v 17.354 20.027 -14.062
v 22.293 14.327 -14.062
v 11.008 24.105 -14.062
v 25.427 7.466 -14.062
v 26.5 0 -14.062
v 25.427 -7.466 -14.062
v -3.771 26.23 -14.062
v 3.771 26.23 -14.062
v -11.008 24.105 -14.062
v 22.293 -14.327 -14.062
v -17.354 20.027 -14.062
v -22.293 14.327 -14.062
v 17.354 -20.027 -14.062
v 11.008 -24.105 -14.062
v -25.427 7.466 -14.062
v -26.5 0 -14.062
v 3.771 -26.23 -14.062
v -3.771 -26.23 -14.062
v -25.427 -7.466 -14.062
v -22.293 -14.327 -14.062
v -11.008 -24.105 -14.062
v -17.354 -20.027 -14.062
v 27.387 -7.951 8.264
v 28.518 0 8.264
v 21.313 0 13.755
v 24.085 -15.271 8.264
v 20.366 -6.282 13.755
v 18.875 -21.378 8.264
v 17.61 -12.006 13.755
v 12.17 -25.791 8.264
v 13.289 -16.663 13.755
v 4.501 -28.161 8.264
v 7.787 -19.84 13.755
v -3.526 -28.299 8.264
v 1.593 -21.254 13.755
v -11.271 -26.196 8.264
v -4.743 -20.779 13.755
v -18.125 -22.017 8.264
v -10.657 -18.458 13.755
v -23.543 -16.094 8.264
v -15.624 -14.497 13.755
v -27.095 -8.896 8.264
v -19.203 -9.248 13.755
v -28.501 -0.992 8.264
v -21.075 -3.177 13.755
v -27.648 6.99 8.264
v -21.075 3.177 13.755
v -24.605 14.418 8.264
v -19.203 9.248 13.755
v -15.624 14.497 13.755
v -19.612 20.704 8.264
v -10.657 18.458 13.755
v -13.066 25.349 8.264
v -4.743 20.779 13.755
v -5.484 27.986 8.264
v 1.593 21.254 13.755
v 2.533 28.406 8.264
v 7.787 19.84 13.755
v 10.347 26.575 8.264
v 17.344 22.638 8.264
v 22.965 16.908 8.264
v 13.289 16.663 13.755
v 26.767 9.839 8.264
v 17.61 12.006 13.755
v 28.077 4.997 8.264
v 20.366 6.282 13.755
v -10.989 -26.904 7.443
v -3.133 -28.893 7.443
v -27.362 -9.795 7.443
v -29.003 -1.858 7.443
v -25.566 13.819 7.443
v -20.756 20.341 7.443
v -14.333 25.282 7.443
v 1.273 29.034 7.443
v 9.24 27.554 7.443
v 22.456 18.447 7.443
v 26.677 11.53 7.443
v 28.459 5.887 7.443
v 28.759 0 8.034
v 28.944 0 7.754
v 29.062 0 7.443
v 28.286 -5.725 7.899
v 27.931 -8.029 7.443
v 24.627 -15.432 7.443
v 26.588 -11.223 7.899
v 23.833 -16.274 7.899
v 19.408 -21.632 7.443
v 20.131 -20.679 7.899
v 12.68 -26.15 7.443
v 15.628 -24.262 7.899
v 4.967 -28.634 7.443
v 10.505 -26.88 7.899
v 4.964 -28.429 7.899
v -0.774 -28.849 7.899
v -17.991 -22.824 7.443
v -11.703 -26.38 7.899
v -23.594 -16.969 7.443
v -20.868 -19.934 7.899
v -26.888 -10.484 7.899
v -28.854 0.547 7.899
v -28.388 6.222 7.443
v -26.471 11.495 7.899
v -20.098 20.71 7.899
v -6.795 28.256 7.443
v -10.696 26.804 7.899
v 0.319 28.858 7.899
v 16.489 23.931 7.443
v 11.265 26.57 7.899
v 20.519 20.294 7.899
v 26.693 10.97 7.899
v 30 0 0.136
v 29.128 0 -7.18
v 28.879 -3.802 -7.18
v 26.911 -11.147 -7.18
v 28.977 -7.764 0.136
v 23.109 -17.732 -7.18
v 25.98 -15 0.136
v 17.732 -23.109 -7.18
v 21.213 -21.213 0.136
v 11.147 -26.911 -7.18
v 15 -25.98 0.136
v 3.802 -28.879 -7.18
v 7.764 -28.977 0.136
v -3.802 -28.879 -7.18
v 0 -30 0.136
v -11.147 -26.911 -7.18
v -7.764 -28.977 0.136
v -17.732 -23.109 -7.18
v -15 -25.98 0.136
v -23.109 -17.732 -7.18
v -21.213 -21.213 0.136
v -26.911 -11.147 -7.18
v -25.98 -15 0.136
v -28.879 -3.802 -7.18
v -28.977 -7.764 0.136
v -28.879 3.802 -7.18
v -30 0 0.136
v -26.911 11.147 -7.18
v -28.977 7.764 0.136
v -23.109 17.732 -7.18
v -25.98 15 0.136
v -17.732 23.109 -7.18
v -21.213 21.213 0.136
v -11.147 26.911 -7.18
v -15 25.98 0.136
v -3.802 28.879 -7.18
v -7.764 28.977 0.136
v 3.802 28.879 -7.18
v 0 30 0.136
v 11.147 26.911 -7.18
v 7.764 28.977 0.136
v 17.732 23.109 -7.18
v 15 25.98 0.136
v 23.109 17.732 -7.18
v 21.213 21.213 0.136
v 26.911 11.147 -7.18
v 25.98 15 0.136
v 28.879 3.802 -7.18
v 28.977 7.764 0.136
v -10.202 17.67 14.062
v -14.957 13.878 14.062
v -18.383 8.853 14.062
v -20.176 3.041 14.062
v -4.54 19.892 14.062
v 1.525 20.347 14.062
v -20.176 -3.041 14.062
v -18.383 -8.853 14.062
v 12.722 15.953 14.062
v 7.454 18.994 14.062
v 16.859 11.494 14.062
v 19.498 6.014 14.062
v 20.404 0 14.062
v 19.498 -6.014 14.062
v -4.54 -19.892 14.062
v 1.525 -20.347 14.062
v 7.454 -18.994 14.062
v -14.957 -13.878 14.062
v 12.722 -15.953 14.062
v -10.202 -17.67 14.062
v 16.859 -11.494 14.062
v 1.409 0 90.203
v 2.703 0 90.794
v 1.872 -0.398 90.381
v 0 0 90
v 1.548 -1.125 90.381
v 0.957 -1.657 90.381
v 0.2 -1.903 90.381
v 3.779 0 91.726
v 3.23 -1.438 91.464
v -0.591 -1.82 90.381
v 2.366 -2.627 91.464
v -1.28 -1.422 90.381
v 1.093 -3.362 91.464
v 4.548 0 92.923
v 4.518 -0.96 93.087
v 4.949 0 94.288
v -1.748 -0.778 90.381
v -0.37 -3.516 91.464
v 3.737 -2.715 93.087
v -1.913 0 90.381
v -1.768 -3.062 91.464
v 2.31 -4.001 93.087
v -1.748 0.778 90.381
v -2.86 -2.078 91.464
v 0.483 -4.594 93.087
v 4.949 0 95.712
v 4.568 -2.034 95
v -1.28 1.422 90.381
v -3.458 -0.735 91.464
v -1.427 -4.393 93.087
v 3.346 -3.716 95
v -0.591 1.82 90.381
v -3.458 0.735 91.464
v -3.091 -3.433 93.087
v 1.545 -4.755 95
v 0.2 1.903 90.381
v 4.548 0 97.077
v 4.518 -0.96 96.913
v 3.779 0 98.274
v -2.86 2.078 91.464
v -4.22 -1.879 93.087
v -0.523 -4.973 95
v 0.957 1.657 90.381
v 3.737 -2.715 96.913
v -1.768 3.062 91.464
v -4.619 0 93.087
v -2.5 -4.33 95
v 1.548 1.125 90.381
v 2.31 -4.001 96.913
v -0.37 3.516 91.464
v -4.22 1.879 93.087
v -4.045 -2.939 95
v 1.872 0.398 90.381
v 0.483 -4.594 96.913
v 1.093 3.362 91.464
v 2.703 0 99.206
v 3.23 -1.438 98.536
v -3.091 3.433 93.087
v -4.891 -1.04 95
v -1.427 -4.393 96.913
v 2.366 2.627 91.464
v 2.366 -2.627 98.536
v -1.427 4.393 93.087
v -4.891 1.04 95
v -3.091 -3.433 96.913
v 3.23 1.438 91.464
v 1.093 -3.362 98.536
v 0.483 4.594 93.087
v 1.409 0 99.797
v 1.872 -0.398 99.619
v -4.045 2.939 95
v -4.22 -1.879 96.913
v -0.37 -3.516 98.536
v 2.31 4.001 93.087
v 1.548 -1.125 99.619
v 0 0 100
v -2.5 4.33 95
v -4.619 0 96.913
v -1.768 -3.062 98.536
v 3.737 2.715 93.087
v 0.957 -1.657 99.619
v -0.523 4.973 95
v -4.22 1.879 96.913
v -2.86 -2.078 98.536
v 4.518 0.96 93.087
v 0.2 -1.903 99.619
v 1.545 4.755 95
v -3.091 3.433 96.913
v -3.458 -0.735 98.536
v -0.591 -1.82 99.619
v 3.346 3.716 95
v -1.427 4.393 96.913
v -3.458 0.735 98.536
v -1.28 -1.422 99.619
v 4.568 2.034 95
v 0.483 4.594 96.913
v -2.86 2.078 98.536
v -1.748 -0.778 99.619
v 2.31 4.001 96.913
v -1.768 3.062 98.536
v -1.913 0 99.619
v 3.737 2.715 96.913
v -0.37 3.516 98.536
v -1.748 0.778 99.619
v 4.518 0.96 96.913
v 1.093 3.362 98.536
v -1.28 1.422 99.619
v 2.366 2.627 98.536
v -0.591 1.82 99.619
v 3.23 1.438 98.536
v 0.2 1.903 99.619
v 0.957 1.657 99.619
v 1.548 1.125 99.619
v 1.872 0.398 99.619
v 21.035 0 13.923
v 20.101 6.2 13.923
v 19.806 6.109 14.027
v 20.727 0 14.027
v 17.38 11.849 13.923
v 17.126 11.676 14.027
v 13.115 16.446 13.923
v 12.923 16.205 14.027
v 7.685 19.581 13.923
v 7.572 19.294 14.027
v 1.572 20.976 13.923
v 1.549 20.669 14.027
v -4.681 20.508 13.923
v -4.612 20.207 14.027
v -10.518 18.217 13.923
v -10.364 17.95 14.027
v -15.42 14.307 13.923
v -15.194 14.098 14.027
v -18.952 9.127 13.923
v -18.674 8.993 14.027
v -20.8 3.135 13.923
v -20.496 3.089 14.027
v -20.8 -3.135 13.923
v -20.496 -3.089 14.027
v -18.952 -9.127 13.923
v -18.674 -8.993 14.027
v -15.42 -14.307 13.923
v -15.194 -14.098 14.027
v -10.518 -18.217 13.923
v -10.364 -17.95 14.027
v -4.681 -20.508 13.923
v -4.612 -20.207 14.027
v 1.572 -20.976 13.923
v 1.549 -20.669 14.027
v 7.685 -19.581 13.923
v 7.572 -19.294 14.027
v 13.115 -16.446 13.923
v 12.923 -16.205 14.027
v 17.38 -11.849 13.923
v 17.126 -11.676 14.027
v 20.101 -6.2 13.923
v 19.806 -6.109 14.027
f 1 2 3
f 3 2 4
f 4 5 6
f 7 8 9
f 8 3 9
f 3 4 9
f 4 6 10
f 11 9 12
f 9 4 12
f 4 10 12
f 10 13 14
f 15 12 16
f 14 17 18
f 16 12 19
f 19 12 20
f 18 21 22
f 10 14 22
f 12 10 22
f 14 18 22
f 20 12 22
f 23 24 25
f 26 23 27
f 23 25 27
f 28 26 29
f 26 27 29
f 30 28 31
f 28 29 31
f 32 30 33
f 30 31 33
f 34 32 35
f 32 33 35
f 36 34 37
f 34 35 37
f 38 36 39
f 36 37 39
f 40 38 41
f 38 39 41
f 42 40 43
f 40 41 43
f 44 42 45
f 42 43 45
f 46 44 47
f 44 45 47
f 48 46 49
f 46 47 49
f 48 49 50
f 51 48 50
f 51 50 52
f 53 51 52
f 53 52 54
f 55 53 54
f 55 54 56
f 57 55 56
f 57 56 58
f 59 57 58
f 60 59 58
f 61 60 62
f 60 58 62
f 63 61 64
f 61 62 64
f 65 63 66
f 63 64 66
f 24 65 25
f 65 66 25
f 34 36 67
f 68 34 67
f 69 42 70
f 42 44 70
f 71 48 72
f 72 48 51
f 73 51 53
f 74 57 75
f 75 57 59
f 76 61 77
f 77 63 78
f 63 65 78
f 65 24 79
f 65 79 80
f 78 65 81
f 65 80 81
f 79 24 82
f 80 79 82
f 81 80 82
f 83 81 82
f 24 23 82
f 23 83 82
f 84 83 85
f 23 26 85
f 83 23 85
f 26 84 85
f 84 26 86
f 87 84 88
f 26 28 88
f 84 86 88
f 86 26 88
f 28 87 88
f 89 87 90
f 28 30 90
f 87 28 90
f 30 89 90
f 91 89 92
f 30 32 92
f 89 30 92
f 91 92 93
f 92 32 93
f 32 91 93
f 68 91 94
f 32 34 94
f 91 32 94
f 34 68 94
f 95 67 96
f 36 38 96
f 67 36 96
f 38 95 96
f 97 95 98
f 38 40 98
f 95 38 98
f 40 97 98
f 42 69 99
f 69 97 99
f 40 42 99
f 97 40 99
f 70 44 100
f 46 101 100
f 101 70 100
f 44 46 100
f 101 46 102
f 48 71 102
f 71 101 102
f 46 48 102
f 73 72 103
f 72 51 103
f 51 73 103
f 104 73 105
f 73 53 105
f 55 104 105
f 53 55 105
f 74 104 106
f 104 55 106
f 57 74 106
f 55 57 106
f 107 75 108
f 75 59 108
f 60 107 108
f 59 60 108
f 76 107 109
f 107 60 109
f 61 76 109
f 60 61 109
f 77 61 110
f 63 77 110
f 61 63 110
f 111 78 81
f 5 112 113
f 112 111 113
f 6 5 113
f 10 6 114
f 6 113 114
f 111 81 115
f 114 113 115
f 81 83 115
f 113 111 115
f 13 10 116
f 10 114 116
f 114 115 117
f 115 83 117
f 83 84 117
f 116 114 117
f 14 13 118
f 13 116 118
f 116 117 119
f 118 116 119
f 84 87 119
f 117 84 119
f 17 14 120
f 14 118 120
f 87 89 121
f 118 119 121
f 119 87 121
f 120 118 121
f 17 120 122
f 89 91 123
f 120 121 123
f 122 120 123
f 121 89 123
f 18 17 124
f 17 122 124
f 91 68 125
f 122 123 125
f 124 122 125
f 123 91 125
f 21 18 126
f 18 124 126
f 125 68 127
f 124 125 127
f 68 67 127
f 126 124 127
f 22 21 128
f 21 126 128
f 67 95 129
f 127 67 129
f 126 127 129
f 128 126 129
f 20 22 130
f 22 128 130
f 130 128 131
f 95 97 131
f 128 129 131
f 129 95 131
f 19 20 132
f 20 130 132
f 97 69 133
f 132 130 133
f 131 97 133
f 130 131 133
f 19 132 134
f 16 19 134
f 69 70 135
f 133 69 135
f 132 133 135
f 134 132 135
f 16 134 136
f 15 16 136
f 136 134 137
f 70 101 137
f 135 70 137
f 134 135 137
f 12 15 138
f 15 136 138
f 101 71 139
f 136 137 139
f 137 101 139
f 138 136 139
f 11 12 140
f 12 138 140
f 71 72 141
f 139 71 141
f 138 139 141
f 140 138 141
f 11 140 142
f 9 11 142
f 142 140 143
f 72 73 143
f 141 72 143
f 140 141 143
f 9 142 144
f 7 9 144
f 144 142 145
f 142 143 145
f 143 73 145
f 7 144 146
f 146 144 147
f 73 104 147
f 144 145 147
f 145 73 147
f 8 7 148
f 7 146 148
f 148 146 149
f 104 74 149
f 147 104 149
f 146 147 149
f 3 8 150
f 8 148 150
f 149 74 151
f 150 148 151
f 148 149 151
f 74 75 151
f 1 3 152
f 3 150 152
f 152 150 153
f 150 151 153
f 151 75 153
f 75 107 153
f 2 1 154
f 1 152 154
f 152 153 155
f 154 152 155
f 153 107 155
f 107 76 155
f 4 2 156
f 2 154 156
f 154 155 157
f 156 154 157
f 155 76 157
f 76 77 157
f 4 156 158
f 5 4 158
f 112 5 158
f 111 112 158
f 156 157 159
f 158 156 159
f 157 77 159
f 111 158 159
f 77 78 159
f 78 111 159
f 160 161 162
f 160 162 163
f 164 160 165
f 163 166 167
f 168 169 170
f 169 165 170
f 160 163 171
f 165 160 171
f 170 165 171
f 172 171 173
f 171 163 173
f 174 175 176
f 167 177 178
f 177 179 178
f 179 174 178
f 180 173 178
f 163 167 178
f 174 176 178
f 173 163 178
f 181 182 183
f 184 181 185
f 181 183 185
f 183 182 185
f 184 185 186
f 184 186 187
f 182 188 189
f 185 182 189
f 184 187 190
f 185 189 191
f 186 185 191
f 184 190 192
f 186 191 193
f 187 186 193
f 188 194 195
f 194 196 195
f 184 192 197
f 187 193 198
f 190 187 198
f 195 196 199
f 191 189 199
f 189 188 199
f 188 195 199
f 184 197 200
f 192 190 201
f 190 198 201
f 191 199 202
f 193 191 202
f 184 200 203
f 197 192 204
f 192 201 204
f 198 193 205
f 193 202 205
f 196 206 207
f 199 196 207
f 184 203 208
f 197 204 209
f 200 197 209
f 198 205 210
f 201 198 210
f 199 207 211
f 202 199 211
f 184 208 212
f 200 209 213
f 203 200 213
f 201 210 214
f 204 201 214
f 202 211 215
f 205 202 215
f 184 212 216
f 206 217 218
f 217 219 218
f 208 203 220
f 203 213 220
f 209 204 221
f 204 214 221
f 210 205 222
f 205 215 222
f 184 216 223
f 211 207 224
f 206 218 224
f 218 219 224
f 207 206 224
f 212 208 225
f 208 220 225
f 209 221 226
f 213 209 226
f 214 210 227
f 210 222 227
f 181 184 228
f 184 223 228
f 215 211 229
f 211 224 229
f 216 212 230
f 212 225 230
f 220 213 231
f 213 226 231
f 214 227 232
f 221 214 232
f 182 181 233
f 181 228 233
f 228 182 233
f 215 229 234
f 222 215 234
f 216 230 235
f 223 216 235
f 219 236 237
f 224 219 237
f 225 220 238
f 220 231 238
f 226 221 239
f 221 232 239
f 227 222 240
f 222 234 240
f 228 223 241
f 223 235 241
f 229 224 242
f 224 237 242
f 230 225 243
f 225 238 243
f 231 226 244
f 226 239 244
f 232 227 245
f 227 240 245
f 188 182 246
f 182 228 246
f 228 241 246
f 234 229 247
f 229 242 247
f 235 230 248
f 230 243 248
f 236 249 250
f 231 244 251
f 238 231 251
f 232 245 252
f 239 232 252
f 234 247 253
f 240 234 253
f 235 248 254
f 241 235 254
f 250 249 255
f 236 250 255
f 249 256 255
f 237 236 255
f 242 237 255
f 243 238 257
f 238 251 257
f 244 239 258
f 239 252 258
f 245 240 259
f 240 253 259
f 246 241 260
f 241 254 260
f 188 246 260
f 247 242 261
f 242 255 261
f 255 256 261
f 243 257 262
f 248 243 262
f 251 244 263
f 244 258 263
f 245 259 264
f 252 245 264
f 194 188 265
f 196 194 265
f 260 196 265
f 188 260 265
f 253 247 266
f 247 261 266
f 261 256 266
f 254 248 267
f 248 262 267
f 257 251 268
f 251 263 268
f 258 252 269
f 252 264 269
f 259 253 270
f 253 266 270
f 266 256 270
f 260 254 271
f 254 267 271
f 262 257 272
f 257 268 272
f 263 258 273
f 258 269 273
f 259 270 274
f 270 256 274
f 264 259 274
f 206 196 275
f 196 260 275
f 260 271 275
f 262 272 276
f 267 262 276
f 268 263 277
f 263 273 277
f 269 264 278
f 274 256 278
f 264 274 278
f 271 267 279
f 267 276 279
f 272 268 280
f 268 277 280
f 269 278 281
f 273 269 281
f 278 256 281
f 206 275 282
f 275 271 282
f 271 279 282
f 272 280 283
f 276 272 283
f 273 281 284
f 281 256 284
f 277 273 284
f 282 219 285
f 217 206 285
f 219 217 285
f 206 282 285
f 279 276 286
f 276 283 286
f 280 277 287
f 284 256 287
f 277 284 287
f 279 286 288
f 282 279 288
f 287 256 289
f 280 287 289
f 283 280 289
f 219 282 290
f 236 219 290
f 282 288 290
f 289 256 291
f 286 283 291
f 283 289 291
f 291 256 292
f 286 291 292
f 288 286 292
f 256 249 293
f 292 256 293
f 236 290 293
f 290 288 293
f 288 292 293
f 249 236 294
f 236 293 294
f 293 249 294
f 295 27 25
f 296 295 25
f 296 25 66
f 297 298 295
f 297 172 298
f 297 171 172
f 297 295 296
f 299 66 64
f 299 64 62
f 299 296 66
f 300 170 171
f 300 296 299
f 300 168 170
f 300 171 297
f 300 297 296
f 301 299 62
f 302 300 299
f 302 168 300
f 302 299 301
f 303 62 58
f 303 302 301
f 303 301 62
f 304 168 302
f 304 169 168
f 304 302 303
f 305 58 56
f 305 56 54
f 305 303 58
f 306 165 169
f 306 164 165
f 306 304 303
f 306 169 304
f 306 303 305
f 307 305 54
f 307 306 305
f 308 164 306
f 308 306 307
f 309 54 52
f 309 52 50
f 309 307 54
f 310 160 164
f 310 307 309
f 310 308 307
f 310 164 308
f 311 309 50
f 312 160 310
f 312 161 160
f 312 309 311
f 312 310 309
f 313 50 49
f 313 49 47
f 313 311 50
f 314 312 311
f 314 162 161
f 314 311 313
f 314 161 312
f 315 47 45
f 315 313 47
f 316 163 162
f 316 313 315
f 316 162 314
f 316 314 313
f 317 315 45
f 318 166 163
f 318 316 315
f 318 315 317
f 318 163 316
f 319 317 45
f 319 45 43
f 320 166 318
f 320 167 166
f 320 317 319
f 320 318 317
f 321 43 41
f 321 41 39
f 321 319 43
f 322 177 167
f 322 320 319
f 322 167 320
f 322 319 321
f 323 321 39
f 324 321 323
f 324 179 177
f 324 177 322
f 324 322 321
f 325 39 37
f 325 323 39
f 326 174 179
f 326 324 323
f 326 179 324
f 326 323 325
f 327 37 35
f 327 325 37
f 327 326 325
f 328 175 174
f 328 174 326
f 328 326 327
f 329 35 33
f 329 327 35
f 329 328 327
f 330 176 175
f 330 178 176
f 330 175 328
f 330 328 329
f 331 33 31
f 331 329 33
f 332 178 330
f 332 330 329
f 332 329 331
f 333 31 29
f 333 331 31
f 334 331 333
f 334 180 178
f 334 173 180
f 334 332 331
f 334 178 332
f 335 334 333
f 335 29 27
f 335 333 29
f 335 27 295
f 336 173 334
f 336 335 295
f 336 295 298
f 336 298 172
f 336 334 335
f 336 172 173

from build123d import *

# Parameters (mm, degrees)
F4_R = 1.5
F5_R = 1.5


# Not quite as in the source:
# - a fillet or chamfer that OpenCascade refuses, or shapes differently, is made with other operations: its cross-section is extruded or revolved along the edge and cut away or added
# - the program builds the solid bodies; features that only make, move or delete a surface that nothing else refers to are left out


with BuildPart() as f2:
    # F0 (on Front) → F2 (revolve)
    with BuildSketch(Plane.XZ):
        with BuildLine():
            Line((0, 14.0623611104), (0, -14.0623611104))
            Line((0, -14.0623611104), (26.5, -14.0623611104))
            ThreePointArc((26.5, -14.0623611104), (30, 0), (26.5, 14.0623611104))
            Line((26.5, 14.0623611104), (0, 14.0623611104))
        make_face()
    revolve(axis=Axis((0, 0, -0.4438906908), (0, 0, -1)))

    # F3: chamfer of 5 on 1 edges, made by hand

    # F3_s1 → F3_t2 (revolve, cut)
    with BuildSketch(Plane.XZ):
        with BuildLine():
            Line((29.0858230111, 7.8312895768), (20.7514586352, 14.1835977215))
            Line((20.7514586352, 14.1835977215), (20.7514586352, 14.2835977215))
            ThreePointArc((20.7514586352, 14.2835977215), (23.6257293176, 14.1623611104), (26.5, 14.1623611104))
            Line((26.5, 14.1623611104), (26.5883333333, 14.1092356475))
            ThreePointArc((26.5883333333, 14.1092356475), (28.005944571, 11.0307329169), (29.1822455377, 7.8577979974))
            Line((29.1822455377, 7.8577979974), (29.0858230111, 7.8312895768))
        make_face()
    revolve(axis=Axis((0, 0, 14.0623611104), (0, 0, -1)), mode=Mode.SUBTRACT)

    # F4
    f4_edges = [f2.edges().sort_by_distance(p)[0] for p in [
        (-20.910524, 0, 14.062361),
    ]]
    fillet(f4_edges, radius=F4_R)

    # F5
    f5_edges = [f2.edges().sort_by_distance(p)[0] for p in [
        (-28.926758, 0, 7.952526),
    ]]
    fillet(f5_edges, radius=F5_R)


with BuildPart() as f7:
    # F0 (on Front) → F7 (revolve)
    with BuildSketch(Plane.XZ):
        with BuildLine():
            ThreePointArc((0, 90), (5, 95), (0, 100))
            Line((0, 100), (0, 90))
        make_face()
    revolve(axis=Axis((0, 0, -0.4438906908), (0, 0, -1)))


solid = Compound([f2.part, f7.part])
